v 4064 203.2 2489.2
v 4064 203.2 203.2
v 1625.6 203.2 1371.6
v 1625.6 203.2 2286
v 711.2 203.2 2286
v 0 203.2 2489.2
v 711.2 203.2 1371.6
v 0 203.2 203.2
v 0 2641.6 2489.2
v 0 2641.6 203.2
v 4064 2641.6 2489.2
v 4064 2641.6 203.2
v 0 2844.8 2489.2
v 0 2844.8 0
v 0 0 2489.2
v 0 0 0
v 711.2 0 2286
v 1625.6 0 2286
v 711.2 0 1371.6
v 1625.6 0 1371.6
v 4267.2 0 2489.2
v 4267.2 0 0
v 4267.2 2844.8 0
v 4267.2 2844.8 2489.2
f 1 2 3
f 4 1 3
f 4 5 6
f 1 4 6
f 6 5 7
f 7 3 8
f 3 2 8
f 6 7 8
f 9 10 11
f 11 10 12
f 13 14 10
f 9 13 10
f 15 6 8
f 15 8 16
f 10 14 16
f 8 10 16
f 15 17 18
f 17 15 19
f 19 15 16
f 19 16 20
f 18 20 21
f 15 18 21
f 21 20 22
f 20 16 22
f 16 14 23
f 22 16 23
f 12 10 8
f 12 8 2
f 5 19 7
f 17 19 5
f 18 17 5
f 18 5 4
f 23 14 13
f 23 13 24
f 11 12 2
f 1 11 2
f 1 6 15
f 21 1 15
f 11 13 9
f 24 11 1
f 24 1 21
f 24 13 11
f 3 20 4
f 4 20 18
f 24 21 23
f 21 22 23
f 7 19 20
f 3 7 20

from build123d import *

# Parameters (mm, degrees)
F0_W     = 4267.2
F0_H     = 2844.8
F1_DEPTH = 203.2
F3_DEPTH = 2286
F4_W     = 914.4
F4_H     = 914.4
F5_DEPTH = 203.2


with BuildPart() as f1:
    # F0 (on Top) → F1 (new body)
    with BuildSketch(Plane.XY):
        with Locations((2133.6, 1422.4)):
            Rectangle(F0_W, F0_H)
    extrude(amount=F1_DEPTH)

    # F2 (on face) → F3 (join)
    with BuildSketch(Plane.XY.offset(203.2)):
        Polygon((0, 203.2), (0, 0), (4267.2, 0), (4267.2, 2844.8), (0, 2844.8), (0, 2641.6), (4064, 2641.6), (4064, 203.2), align=None)
    extrude(amount=F3_DEPTH)

    # F4 (on face) → F5 (cut, through all)
    with BuildSketch(Plane.XZ):
        with Locations((1168.4, 1828.8)):
            Rectangle(F4_W, F4_H)
    extrude(amount=-F5_DEPTH, mode=Mode.SUBTRACT)


solid = f1.part
